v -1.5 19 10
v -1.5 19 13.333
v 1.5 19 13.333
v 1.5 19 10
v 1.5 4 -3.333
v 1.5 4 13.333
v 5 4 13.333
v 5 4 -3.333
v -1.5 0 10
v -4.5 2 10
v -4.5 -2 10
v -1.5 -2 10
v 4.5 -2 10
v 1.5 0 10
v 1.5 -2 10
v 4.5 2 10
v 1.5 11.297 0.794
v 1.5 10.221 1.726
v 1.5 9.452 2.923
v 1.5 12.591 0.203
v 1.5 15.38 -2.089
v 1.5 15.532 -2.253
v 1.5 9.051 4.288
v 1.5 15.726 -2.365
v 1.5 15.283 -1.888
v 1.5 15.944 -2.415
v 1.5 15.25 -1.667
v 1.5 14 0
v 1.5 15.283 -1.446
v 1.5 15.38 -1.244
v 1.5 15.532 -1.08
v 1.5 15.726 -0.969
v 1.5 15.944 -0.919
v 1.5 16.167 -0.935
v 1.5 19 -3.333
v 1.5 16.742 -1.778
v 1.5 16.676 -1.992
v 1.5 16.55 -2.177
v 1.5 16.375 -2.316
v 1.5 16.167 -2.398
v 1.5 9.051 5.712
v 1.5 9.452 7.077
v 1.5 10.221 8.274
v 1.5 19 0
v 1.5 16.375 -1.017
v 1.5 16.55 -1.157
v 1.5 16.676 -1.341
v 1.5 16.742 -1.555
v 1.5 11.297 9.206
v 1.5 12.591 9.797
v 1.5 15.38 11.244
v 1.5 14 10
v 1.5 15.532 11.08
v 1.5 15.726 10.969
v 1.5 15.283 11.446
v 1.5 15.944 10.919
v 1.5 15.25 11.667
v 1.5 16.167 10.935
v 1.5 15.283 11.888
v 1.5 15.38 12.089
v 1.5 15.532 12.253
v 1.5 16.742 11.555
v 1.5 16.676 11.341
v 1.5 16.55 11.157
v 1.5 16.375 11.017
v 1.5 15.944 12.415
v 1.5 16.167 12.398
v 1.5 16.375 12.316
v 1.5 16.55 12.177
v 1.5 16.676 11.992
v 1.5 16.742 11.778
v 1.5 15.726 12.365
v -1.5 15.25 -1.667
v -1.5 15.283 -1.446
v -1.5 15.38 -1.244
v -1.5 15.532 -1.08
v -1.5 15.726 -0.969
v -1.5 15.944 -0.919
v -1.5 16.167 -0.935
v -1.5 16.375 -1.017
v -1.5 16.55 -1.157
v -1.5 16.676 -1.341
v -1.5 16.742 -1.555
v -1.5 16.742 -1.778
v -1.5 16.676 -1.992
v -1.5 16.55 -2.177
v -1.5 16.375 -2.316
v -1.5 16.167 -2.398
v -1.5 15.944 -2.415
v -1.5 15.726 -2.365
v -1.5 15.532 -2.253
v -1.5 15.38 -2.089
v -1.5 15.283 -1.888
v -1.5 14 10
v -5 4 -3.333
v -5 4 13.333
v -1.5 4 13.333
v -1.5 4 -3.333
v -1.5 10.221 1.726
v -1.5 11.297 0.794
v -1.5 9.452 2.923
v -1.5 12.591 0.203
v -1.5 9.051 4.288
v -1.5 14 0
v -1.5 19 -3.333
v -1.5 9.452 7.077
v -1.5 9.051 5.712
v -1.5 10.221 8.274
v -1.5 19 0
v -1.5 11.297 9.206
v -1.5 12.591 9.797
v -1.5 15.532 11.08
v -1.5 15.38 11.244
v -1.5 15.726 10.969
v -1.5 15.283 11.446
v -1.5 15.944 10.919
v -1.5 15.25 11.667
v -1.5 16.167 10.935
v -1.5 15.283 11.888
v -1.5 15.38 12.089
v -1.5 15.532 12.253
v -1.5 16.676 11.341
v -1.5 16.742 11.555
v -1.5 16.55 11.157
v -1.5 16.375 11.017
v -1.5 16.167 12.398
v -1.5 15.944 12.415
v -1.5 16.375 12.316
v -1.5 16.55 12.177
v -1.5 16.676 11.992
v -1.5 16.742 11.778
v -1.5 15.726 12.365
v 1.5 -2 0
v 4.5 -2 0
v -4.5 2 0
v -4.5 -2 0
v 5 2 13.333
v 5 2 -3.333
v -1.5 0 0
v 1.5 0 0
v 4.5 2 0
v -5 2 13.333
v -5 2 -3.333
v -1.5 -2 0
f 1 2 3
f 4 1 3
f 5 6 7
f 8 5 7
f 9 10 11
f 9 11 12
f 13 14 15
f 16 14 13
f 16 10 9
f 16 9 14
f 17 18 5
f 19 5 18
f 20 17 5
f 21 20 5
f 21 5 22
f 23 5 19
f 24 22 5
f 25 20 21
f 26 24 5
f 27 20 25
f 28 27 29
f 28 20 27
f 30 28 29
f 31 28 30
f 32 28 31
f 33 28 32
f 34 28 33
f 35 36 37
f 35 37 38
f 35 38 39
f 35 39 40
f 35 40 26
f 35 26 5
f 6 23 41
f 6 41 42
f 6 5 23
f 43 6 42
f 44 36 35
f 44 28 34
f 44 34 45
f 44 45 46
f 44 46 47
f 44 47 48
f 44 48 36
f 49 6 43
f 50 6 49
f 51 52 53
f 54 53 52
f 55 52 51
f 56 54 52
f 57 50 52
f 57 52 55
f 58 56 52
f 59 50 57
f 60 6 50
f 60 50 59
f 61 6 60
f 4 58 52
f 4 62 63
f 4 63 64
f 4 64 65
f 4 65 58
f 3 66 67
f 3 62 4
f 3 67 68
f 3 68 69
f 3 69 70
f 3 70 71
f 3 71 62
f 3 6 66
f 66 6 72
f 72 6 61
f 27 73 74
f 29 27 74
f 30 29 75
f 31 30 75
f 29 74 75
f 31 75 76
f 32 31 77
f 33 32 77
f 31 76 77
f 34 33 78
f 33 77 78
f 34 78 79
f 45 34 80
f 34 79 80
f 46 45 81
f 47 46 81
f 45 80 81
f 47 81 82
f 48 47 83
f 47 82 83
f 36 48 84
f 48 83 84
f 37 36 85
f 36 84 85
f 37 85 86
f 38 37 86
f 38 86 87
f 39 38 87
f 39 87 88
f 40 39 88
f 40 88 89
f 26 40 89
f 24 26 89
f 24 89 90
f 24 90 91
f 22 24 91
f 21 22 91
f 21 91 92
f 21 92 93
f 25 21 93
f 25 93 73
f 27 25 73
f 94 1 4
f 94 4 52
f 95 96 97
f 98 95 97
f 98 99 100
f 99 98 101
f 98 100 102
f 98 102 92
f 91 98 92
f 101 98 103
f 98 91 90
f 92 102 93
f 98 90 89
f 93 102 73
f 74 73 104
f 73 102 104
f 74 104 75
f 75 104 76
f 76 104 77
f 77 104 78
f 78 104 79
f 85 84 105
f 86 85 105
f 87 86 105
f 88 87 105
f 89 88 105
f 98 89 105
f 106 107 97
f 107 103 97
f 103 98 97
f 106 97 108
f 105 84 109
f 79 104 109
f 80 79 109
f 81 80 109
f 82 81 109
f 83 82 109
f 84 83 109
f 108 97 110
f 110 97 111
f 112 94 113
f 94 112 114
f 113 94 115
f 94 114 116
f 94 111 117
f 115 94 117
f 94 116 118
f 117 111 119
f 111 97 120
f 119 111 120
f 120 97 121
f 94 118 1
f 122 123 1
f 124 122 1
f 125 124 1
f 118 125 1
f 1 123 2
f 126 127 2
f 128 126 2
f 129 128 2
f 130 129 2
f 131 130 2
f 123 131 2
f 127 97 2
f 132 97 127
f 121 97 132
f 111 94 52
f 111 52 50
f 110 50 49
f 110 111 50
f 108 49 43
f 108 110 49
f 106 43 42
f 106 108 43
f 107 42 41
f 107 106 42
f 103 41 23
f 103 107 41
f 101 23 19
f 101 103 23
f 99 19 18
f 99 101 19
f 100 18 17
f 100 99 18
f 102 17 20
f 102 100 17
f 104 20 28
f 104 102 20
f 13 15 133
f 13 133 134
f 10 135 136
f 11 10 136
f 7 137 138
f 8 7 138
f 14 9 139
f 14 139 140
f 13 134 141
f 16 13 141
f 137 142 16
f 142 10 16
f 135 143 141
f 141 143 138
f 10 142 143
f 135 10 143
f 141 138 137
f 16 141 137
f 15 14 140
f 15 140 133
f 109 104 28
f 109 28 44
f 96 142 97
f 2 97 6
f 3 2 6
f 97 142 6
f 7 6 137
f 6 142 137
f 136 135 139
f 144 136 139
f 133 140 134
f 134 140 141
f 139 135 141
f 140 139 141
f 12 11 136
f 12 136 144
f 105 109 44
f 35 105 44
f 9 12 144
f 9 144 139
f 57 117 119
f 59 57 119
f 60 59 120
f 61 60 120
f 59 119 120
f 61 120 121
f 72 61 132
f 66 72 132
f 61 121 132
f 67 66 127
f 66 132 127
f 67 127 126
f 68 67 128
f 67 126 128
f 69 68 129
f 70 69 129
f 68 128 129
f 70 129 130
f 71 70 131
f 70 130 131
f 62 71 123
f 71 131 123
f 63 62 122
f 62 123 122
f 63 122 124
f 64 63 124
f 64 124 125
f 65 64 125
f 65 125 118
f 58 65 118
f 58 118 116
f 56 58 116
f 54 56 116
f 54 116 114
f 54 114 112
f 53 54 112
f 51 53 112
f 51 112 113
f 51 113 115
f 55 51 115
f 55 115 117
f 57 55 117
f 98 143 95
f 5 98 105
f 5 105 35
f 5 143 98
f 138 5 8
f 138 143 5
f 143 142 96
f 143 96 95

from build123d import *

# Parameters (mm, degrees)
BOSS_EXTRUDE1_DEPTH = 10
SKETCH2_W           = 10
SKETCH2_H           = 16.666666666
BOSS_EXTRUDE2_DEPTH = 2
SKETCH3_W           = 3
SKETCH3_H           = 15
BOSS_EXTRUDE3_DEPTH = 16.666666667
CUT_EXTRUDE1_DEPTH  = 25.104517788
SKETCH5_R           = 0.75
CUT_EXTRUDE2_DEPTH  = 25.104517788


with BuildPart() as part:
    # Sketch1 → Boss-Extrude1 (new body)
    with BuildSketch(Plane.XY):
        Polygon((-1.5, -2), (-1.5, 0), (1.5, 0), (1.5, -2), (4.5, -2), (4.5, 2), (-4.5, 2), (-4.5, -2), align=None)
    extrude(amount=BOSS_EXTRUDE1_DEPTH)

    # Sketch2 → Boss-Extrude2 (add)
    with BuildSketch(Plane(origin=(0, 2, 0), x_dir=(1, 0, 0), z_dir=(0, 1, 0))):
        with Locations((0, -5)):
            Rectangle(SKETCH2_W, SKETCH2_H)
    extrude(amount=BOSS_EXTRUDE2_DEPTH)

    # Sketch3 → Boss-Extrude3 (add)
    with BuildSketch(Plane.XY.offset(13.333333333)):
        with Locations((0, 11.5)):
            Rectangle(SKETCH3_W, SKETCH3_H)
    extrude(amount=-BOSS_EXTRUDE3_DEPTH)

    # Sketch4 → Cut-Extrude1 (cut, through all)
    with BuildSketch(Plane.ZY.offset(1.5)):
        with BuildLine():
            Line((0, 14), (0, 19))
            Line((0, 19), (10, 19))
            Line((10, 19), (10, 14))
            ThreePointArc((10, 14), (5, 9), (0, 14))
        make_face()
    extrude(amount=-CUT_EXTRUDE1_DEPTH, mode=Mode.SUBTRACT)

    # Sketch5 → Cut-Extrude2 (cut, through all)
    with BuildSketch(Plane.ZY.offset(1.5)):
        with Locations(Location((11.666666667, 16, 0), (0, 0, 270))):
            Circle(SKETCH5_R)
        with Locations(Location((-1.666666667, 16, 0), (0, 0, 270))):
            Circle(SKETCH5_R)
    extrude(amount=-CUT_EXTRUDE2_DEPTH, mode=Mode.SUBTRACT)


solid = part.part
